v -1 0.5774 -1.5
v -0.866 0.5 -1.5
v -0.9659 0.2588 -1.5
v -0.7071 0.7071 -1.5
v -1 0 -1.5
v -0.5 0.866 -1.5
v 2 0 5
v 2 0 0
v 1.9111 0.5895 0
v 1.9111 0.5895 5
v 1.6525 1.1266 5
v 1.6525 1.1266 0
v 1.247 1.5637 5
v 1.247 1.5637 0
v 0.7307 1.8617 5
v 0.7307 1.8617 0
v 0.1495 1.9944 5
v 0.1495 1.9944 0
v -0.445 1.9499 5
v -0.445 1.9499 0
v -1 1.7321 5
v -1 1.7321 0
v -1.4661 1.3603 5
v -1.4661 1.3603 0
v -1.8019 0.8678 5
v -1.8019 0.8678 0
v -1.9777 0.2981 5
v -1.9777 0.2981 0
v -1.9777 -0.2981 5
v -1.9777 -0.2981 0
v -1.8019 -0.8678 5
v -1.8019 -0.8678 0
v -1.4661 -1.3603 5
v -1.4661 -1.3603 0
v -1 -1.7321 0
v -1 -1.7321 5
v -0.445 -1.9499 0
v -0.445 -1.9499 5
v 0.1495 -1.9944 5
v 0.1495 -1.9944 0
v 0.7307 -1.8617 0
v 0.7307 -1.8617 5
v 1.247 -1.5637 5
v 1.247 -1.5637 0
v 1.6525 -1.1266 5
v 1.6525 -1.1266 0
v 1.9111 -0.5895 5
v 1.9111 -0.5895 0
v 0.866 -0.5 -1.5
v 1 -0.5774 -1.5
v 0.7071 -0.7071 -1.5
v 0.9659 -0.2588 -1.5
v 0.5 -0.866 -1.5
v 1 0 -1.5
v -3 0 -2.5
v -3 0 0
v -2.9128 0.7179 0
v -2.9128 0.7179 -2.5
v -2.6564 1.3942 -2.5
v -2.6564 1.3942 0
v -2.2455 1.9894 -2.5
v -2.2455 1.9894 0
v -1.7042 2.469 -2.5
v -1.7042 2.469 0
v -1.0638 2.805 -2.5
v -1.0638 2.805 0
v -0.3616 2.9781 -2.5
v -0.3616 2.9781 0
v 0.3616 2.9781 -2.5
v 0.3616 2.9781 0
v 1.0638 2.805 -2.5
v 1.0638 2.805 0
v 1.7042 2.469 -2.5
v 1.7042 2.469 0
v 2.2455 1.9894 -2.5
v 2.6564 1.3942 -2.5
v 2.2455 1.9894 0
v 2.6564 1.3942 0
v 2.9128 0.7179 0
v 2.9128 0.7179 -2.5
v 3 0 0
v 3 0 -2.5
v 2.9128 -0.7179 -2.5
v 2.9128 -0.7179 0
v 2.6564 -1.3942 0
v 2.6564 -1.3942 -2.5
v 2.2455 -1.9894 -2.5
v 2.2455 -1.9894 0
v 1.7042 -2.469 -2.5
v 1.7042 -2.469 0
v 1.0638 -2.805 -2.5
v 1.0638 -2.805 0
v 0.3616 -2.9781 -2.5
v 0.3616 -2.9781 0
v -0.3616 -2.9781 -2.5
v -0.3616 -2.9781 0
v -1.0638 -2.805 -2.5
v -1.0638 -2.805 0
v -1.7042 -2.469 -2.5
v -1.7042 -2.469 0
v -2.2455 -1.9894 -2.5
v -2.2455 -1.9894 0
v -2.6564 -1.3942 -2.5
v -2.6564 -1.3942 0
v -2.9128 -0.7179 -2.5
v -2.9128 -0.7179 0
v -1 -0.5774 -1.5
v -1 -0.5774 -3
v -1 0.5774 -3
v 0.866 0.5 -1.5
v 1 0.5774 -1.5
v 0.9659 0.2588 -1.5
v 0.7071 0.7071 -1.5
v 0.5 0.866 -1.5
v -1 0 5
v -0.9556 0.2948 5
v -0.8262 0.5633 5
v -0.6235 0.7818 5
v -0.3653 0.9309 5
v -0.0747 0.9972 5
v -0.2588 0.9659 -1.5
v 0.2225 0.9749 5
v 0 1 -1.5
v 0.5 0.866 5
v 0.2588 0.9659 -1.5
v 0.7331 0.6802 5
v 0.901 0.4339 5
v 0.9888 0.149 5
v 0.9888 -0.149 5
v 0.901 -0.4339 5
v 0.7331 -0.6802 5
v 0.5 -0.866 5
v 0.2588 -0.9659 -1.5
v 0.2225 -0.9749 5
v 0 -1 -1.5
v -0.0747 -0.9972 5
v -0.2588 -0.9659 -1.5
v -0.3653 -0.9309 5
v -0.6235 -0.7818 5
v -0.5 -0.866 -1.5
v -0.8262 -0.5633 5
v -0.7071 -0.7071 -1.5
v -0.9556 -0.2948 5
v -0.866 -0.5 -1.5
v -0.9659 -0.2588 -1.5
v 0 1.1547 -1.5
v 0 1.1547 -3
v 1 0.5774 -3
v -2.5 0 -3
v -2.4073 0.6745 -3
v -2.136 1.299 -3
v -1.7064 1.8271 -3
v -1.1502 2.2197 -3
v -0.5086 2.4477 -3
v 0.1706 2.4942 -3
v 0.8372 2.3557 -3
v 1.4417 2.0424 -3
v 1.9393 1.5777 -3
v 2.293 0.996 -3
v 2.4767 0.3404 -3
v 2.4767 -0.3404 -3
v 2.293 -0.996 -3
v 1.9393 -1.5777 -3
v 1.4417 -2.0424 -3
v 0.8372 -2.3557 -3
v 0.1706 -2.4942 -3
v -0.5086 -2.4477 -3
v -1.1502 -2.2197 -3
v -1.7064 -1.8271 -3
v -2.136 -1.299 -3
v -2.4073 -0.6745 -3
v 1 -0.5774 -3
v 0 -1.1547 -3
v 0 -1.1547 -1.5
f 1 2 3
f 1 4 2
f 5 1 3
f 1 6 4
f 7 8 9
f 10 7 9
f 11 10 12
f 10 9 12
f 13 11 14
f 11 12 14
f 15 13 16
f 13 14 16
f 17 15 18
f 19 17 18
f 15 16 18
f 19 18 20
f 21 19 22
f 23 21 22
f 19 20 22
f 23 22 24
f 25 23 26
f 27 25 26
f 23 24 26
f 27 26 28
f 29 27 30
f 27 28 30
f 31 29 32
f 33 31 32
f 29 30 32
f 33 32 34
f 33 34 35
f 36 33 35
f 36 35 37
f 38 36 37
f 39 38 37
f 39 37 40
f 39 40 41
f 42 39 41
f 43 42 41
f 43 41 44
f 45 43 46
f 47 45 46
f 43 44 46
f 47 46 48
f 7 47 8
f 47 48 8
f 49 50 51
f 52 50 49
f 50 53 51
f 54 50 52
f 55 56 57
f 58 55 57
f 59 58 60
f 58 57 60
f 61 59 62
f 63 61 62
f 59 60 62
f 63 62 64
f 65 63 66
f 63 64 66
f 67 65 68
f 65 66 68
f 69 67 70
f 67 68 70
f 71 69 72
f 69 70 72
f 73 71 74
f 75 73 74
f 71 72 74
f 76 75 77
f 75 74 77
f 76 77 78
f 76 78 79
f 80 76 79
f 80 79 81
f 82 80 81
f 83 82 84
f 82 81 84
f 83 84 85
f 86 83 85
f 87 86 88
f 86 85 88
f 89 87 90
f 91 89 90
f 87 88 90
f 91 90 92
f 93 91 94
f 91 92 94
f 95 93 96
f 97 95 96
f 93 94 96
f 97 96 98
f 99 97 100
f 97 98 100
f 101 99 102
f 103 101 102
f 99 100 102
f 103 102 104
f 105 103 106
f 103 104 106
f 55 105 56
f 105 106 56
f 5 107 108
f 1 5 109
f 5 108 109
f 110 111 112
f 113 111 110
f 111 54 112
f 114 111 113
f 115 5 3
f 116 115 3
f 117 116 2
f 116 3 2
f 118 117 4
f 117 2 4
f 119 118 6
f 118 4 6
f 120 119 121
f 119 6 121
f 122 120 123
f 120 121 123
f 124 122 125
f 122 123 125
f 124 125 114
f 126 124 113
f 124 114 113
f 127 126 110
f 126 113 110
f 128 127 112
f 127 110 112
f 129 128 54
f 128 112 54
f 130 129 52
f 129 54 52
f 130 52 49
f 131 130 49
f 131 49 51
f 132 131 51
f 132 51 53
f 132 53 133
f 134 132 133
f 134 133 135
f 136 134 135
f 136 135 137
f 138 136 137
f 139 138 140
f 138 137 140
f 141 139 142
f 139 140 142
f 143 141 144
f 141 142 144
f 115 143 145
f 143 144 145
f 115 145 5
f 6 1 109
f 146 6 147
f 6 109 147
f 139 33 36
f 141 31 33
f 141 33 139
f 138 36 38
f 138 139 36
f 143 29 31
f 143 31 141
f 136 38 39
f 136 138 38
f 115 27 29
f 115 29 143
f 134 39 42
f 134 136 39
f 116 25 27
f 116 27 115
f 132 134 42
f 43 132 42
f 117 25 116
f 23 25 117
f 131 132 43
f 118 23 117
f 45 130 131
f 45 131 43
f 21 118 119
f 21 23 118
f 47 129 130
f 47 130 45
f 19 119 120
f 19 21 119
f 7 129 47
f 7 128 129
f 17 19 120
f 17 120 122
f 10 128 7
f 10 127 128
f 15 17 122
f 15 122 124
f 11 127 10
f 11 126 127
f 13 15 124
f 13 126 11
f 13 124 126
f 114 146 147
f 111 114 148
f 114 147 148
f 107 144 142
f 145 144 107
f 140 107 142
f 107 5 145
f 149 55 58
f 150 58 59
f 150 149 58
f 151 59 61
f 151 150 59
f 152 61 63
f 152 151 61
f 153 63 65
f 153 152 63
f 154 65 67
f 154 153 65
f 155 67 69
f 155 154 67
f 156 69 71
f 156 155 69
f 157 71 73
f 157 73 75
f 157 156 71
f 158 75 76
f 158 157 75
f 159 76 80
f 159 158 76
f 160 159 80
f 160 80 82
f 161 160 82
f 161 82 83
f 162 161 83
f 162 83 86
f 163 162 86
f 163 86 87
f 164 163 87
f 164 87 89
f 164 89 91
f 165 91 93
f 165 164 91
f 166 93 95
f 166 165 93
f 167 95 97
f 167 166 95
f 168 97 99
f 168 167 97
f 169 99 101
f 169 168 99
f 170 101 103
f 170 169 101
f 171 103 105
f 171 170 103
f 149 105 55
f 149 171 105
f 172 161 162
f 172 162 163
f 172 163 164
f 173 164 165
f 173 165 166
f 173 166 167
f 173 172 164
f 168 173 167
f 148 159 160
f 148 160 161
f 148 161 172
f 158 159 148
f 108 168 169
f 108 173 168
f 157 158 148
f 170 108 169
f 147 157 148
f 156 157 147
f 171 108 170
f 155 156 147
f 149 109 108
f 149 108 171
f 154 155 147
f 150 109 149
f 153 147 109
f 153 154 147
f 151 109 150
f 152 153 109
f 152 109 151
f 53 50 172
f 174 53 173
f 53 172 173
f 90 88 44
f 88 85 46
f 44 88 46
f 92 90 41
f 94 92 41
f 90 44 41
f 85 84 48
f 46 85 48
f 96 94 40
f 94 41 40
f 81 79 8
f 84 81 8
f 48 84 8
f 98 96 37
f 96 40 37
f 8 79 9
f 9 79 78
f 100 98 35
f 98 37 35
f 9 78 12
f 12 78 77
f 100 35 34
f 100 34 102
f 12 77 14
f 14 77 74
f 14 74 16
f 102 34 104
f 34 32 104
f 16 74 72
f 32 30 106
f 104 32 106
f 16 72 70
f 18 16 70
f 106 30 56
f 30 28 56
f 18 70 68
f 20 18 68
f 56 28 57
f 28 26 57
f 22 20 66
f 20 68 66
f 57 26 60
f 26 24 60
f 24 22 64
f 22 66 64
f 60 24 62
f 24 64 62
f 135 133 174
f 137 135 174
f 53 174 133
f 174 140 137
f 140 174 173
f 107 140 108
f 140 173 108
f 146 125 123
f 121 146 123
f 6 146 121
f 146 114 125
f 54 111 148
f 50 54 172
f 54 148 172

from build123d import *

# Parameters (mm, degrees)
SKETCH1_R           = 2
BOSS_EXTRUDE1_DEPTH = 5
SKETCH2_R           = 3
BOSS_EXTRUDE2_DEPTH = 3
CHAMFER1_SIZE       = 0.5
CUT_EXTRUDE3_DEPTH  = 1.5
SKETCH6_R           = 1
CUT_EXTRUDE4_DEPTH  = 8.762087348


with BuildPart() as part:
    # Sketch1 → Boss-Extrude1 (new body)
    with BuildSketch(Plane.XY):
        Circle(SKETCH1_R)
    extrude(amount=BOSS_EXTRUDE1_DEPTH)

    # Sketch2 → Boss-Extrude2 (add)
    with BuildSketch(Plane(origin=(0, 0, 0), x_dir=(-1, 0, 0), z_dir=(0, 0, -1))):
        Circle(SKETCH2_R)
    extrude(amount=BOSS_EXTRUDE2_DEPTH)

    # Chamfer1
    chamfer1_edges = [part.edges().sort_by_distance(p)[0] for p in [
        (3, 0, -3),
    ]]
    chamfer(chamfer1_edges, length=CHAMFER1_SIZE)

    # Sketch5 → Cut-Extrude3 (cut)
    with BuildSketch(Plane(origin=(0, 0, -3), x_dir=(-1, 0, 0), z_dir=(0, 0, -1))):
        Polygon((0, -1.154700538), (1, -0.577350269), (1, 0.577350269), (0, 1.154700538), (-1, 0.577350269), (-1, -0.577350269), align=None)
    extrude(amount=-CUT_EXTRUDE3_DEPTH, mode=Mode.SUBTRACT)

    # Sketch6 → Cut-Extrude4 (cut, through all)
    with BuildSketch(Plane(origin=(0, 0, -1.5), x_dir=(-1, 0, 0), z_dir=(0, 0, -1))):
        Circle(SKETCH6_R)
    extrude(amount=-CUT_EXTRUDE4_DEPTH, mode=Mode.SUBTRACT)


solid = part.part
